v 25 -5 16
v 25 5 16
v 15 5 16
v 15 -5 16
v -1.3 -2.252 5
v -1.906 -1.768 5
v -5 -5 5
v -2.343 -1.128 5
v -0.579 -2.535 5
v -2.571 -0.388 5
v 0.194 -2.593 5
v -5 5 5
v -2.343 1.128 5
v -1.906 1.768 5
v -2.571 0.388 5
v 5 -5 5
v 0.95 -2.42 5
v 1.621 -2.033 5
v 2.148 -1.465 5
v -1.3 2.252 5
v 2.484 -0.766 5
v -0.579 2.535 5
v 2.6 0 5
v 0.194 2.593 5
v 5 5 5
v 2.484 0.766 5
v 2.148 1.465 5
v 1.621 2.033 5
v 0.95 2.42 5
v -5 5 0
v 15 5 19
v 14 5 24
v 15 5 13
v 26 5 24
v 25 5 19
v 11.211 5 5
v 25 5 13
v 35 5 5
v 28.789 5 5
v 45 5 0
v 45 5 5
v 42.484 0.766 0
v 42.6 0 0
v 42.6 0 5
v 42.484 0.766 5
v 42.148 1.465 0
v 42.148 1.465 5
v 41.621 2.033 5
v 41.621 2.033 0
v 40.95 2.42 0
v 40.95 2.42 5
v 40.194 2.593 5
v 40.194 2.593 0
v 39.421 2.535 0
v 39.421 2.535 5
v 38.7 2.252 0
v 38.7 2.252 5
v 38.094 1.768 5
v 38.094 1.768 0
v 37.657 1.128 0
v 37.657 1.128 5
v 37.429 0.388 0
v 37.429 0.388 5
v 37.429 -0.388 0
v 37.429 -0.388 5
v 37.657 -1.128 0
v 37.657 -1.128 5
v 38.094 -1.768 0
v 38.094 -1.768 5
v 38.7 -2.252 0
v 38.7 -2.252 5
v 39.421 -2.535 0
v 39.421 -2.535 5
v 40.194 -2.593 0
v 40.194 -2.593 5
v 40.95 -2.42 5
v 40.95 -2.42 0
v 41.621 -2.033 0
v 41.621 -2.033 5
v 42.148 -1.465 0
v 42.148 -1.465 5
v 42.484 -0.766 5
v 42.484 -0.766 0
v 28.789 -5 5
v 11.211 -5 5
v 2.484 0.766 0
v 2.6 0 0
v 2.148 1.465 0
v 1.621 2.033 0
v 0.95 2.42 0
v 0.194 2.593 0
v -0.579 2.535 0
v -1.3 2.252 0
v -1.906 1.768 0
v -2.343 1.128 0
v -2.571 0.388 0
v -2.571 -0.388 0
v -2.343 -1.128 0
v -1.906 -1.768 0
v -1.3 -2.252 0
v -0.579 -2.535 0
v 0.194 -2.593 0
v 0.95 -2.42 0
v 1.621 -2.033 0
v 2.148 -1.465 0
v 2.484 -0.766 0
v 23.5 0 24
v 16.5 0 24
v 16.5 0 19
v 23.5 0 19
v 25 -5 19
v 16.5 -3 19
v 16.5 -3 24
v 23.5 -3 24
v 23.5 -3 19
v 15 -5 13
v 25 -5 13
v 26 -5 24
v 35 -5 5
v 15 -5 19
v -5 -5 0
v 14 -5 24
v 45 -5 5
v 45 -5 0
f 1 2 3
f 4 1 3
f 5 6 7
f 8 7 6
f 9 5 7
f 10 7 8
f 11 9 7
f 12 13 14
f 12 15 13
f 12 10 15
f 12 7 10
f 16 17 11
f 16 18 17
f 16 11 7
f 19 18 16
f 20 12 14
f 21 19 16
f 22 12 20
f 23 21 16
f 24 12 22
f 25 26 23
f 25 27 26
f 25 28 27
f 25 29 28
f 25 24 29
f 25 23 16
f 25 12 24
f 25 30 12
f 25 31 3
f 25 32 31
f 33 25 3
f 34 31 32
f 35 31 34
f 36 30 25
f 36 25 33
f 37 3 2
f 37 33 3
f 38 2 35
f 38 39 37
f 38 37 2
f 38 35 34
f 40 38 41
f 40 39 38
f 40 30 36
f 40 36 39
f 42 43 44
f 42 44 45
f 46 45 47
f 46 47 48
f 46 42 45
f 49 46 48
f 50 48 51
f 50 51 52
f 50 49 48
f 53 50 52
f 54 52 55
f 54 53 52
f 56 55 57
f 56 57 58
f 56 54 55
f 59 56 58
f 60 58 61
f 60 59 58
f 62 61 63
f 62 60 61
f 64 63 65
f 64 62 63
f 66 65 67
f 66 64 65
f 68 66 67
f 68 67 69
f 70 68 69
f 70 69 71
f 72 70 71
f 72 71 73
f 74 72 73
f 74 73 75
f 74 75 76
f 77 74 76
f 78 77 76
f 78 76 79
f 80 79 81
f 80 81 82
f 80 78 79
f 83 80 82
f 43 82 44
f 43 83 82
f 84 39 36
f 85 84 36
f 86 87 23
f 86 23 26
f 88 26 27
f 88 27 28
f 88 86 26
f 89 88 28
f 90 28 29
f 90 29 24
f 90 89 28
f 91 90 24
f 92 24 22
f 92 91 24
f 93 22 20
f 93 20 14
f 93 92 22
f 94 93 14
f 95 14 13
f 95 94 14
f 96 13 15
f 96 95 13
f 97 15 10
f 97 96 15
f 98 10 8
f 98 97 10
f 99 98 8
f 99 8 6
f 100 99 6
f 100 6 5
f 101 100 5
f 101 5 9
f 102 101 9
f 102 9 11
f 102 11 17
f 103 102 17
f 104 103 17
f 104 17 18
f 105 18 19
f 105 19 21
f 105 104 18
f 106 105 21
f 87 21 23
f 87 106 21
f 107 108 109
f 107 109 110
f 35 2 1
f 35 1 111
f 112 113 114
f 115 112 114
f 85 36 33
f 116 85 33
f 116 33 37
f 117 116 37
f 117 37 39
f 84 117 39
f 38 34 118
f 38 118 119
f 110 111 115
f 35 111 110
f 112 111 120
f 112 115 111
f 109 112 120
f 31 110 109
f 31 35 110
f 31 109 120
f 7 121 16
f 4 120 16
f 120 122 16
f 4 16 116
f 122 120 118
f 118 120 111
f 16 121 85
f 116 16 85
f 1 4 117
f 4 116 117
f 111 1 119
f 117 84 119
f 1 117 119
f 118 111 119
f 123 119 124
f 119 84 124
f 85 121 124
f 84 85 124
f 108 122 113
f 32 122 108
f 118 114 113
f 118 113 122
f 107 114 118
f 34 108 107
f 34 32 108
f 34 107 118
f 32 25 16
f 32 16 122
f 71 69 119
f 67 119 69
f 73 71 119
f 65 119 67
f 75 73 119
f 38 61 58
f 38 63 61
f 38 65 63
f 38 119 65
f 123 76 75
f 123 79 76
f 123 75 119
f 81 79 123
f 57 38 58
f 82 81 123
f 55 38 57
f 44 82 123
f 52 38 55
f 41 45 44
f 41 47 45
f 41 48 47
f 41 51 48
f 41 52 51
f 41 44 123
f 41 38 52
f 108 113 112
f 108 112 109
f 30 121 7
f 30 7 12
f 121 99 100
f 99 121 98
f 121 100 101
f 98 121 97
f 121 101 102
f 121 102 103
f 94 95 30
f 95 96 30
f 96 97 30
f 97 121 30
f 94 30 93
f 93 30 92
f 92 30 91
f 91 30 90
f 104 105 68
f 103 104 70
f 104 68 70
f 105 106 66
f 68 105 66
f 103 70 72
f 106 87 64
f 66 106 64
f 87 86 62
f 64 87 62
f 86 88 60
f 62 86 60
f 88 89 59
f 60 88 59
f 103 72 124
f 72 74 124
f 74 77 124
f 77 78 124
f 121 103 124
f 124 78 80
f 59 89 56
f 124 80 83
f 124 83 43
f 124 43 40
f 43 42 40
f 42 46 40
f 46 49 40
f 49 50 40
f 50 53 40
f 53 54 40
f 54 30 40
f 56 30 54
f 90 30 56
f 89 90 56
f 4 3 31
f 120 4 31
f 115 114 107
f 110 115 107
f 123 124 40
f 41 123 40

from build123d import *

# Parameters (mm, degrees)
F0_W     = 50
F0_H     = 10
F0_R     = 2.6
F1_DEPTH = 5
F2_W     = 10
F2_H     = 3
F3_DEPTH = 10
F4_W     = 7
F4_H     = 3
F5_DEPTH = 8
F7_DEPTH = 10


with BuildPart() as f1:
    # F0 (on Top) → F1 (new body)
    with BuildSketch(Plane.XY):
        with Locations((20, 0)):
            Rectangle(F0_W, F0_H)
        Circle(F0_R, mode=Mode.SUBTRACT)
        with Locations((40, 0)):
            Circle(F0_R, mode=Mode.SUBTRACT)
    extrude(amount=F1_DEPTH)

    # F2 (on face) → F3 (join)
    with BuildSketch(Plane(origin=(0, 5, 0), x_dir=(-1, 0, 0), z_dir=(0, 1, 0))):
        Polygon((-35, 5), (-5, 5), (-14, 24), (-20, 24), (-26, 24), align=None)
        with Locations((-20, 17.5)):
            Rectangle(F2_W, F2_H, mode=Mode.SUBTRACT)
    extrude(amount=-F3_DEPTH)

    # F4 (on face) → F5 (cut)
    with BuildSketch(Plane.XY.offset(24)):
        with Locations((20, -1.5)):
            Rectangle(F4_W, F4_H)
    extrude(amount=-F5_DEPTH, mode=Mode.SUBTRACT)

    # F6 (on face) → F7 (cut, through all)
    with BuildSketch(Plane(origin=(0, 5, 0), x_dir=(-1, 0, 0), z_dir=(0, 1, 0))):
        Polygon((-15, 13), (-25, 13), (-28.789474, 5), (-11.210526, 5), align=None)
    extrude(amount=-F7_DEPTH, mode=Mode.SUBTRACT)


solid = f1.part
